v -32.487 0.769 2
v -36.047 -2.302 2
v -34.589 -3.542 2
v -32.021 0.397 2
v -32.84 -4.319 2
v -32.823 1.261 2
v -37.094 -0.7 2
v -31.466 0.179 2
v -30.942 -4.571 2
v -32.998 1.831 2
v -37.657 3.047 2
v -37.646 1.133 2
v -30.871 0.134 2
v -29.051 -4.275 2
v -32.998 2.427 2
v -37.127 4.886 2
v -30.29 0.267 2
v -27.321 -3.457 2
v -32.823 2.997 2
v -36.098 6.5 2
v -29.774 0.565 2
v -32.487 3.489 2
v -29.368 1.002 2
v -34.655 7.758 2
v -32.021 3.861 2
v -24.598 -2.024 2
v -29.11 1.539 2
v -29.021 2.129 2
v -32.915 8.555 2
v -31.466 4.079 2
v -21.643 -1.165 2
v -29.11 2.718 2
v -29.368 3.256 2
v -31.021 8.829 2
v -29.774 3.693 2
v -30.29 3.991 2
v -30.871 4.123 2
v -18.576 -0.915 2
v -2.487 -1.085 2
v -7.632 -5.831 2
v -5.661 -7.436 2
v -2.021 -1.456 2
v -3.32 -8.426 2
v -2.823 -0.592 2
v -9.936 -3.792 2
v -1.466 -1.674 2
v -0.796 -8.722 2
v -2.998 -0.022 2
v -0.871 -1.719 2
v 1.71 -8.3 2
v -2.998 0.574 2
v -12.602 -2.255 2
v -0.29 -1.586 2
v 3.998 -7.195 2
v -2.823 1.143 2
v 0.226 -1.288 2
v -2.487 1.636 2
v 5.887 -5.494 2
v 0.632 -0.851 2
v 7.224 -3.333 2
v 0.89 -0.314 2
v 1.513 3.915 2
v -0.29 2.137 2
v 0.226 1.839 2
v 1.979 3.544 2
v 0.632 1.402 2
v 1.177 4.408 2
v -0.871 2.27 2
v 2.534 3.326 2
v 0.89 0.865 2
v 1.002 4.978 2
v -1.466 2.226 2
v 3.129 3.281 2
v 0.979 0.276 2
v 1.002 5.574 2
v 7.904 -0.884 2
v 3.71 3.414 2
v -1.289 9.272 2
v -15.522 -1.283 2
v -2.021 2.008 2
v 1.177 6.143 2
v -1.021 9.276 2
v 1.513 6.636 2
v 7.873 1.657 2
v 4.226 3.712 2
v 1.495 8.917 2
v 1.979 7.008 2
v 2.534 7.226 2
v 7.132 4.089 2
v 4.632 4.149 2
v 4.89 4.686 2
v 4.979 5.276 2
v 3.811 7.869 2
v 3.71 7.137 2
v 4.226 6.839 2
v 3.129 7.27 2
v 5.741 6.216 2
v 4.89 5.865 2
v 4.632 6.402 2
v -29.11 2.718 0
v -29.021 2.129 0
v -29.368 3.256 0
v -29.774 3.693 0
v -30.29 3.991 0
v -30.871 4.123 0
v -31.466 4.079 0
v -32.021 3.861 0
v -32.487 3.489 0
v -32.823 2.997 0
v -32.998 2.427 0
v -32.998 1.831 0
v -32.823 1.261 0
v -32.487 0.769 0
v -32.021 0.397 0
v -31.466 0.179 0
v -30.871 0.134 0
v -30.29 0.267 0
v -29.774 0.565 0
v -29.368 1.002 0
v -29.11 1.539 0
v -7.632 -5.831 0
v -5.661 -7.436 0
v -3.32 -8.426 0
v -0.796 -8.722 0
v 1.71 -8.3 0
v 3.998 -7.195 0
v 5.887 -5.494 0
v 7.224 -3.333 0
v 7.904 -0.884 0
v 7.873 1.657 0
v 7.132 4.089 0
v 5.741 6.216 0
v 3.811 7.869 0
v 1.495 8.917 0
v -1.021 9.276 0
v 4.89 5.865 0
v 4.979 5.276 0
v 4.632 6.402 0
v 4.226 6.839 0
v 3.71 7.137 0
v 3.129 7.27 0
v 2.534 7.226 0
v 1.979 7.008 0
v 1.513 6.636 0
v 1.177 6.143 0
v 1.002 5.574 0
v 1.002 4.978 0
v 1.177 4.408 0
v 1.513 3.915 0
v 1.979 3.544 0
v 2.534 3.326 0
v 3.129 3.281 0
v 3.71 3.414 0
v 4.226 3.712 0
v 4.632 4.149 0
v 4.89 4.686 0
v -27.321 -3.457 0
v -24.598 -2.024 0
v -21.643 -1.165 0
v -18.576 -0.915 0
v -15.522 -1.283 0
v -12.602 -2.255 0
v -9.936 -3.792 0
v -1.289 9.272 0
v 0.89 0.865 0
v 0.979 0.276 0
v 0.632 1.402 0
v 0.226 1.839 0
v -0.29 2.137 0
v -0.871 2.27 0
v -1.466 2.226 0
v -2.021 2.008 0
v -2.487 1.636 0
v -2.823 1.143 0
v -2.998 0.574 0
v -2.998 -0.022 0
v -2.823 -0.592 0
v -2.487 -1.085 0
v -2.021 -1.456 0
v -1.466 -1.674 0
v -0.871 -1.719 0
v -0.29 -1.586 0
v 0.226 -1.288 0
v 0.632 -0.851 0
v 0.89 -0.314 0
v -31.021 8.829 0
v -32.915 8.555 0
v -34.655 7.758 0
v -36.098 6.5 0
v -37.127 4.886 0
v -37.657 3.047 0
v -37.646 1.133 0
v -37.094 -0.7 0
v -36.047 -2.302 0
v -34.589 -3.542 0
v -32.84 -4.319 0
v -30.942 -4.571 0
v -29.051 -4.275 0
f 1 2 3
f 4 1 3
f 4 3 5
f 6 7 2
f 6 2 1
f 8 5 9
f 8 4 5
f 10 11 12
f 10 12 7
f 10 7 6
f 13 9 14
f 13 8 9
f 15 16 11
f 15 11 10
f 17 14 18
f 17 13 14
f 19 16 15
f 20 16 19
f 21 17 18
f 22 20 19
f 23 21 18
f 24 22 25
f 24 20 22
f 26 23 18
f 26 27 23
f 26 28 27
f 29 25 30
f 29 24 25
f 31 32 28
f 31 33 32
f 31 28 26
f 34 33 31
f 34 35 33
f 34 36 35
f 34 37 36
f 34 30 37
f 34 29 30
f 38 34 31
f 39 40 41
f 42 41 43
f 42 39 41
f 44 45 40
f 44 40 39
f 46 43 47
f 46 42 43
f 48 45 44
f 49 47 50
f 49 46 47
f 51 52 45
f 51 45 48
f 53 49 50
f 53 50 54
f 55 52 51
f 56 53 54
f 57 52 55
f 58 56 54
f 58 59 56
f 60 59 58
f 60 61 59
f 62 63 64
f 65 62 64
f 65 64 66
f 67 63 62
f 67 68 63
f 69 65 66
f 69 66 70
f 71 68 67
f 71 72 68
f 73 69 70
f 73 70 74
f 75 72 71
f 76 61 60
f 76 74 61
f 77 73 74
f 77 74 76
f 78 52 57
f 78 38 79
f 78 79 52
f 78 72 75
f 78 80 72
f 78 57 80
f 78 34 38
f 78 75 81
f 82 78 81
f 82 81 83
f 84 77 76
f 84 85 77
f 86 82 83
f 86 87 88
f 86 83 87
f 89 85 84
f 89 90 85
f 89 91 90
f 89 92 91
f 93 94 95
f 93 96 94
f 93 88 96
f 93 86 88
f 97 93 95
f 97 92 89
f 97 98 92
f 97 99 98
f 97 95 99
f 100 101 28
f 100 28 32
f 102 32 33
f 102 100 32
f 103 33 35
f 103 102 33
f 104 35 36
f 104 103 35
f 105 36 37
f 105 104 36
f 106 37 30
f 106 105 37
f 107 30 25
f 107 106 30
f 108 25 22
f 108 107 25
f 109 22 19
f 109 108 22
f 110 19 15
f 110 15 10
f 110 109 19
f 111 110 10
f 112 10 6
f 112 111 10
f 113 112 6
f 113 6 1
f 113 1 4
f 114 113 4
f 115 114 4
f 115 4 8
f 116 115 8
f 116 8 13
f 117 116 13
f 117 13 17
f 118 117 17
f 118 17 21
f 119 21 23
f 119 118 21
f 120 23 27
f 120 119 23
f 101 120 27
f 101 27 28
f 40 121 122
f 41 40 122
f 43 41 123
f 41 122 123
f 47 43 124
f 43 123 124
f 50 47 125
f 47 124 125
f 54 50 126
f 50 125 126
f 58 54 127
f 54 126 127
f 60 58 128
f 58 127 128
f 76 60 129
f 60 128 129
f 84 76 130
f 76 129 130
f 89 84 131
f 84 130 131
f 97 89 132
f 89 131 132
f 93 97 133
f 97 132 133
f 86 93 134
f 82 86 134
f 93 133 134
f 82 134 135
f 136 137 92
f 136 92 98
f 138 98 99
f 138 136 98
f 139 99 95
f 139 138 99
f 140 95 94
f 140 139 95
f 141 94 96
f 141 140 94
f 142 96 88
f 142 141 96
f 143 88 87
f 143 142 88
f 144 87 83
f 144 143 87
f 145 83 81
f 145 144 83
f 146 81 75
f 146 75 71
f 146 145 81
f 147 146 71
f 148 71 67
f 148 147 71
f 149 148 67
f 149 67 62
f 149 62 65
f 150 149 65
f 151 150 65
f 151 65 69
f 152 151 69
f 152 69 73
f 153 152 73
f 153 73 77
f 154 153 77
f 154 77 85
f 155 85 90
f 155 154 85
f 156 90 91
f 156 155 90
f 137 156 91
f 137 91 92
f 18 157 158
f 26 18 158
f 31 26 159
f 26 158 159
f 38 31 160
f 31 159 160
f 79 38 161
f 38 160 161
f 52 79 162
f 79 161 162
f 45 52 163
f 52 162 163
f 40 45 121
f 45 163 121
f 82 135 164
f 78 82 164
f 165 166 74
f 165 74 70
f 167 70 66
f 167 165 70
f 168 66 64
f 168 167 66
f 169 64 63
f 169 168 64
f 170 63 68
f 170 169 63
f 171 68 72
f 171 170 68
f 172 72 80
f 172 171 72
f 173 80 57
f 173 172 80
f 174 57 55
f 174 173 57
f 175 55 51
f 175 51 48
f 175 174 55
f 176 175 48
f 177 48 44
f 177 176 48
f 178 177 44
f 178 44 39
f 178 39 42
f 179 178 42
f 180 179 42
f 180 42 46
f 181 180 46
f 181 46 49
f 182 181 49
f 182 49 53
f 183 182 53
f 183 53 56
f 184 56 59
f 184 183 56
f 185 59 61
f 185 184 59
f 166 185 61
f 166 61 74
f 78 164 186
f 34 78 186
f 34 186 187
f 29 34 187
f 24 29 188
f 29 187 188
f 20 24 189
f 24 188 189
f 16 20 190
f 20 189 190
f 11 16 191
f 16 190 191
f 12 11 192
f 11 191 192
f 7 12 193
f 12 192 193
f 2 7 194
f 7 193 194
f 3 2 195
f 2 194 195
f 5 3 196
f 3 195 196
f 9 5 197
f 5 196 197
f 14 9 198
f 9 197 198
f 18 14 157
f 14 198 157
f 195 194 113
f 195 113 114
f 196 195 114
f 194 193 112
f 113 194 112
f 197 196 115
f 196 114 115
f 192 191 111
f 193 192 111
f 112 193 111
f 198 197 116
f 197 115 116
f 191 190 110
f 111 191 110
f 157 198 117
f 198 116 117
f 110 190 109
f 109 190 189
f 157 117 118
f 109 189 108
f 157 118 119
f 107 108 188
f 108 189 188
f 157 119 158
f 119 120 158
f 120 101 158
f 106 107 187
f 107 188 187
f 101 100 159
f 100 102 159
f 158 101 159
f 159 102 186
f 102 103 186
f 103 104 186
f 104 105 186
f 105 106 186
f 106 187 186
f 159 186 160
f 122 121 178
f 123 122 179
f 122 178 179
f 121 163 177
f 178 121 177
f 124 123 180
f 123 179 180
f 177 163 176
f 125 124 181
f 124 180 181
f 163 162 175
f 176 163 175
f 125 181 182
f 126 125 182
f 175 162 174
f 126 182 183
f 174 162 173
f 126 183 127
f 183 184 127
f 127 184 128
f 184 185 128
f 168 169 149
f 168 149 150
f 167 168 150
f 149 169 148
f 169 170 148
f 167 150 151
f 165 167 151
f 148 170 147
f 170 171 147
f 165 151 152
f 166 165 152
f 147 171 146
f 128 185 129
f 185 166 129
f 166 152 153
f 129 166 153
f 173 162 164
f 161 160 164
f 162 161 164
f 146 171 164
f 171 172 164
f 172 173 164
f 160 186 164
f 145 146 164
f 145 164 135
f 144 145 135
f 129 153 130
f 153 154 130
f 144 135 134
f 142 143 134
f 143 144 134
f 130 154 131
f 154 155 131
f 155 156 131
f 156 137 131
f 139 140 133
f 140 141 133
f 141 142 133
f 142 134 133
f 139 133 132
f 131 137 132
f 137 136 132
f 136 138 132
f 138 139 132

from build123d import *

# Parameters (mm, degrees)
SKETCH1_R           = 2
BOSS_EXTRUDE1_DEPTH = 2


with BuildPart() as part:
    # Sketch1 → Boss-Extrude1 (new body)
    with BuildSketch(Plane.XY):
        with BuildLine():
            Line((-1.2887257, 9.27170727), (-31.0207003, 8.828891045))
            ThreePointArc((-31.0207003, 8.828891045), (-37.4360697, 0.196784564), (-27.320647525, -3.456770014))
            ThreePointArc((-27.320647525, -3.456770014), (-17.039618289, -1.022120458), (-7.632023625, -5.830887792))
            ThreePointArc((-7.632023625, -5.830887792), (7.224276423, -3.332674299), (-1.0207003, 9.275699134))
            Line((-1.0207003, 9.275699134), (-1.2887257, 9.27170727))
        make_face()
        with Locations((-31.0207003, 2.128891045)):
            Circle(SKETCH1_R, mode=Mode.SUBTRACT)
        with Locations((-1.0207003, 0.275699134)):
            Circle(SKETCH1_R, mode=Mode.SUBTRACT)
        with Locations((2.9792997, 5.275699134)):
            Circle(SKETCH1_R, mode=Mode.SUBTRACT)
    extrude(amount=BOSS_EXTRUDE1_DEPTH)


solid = part.part
